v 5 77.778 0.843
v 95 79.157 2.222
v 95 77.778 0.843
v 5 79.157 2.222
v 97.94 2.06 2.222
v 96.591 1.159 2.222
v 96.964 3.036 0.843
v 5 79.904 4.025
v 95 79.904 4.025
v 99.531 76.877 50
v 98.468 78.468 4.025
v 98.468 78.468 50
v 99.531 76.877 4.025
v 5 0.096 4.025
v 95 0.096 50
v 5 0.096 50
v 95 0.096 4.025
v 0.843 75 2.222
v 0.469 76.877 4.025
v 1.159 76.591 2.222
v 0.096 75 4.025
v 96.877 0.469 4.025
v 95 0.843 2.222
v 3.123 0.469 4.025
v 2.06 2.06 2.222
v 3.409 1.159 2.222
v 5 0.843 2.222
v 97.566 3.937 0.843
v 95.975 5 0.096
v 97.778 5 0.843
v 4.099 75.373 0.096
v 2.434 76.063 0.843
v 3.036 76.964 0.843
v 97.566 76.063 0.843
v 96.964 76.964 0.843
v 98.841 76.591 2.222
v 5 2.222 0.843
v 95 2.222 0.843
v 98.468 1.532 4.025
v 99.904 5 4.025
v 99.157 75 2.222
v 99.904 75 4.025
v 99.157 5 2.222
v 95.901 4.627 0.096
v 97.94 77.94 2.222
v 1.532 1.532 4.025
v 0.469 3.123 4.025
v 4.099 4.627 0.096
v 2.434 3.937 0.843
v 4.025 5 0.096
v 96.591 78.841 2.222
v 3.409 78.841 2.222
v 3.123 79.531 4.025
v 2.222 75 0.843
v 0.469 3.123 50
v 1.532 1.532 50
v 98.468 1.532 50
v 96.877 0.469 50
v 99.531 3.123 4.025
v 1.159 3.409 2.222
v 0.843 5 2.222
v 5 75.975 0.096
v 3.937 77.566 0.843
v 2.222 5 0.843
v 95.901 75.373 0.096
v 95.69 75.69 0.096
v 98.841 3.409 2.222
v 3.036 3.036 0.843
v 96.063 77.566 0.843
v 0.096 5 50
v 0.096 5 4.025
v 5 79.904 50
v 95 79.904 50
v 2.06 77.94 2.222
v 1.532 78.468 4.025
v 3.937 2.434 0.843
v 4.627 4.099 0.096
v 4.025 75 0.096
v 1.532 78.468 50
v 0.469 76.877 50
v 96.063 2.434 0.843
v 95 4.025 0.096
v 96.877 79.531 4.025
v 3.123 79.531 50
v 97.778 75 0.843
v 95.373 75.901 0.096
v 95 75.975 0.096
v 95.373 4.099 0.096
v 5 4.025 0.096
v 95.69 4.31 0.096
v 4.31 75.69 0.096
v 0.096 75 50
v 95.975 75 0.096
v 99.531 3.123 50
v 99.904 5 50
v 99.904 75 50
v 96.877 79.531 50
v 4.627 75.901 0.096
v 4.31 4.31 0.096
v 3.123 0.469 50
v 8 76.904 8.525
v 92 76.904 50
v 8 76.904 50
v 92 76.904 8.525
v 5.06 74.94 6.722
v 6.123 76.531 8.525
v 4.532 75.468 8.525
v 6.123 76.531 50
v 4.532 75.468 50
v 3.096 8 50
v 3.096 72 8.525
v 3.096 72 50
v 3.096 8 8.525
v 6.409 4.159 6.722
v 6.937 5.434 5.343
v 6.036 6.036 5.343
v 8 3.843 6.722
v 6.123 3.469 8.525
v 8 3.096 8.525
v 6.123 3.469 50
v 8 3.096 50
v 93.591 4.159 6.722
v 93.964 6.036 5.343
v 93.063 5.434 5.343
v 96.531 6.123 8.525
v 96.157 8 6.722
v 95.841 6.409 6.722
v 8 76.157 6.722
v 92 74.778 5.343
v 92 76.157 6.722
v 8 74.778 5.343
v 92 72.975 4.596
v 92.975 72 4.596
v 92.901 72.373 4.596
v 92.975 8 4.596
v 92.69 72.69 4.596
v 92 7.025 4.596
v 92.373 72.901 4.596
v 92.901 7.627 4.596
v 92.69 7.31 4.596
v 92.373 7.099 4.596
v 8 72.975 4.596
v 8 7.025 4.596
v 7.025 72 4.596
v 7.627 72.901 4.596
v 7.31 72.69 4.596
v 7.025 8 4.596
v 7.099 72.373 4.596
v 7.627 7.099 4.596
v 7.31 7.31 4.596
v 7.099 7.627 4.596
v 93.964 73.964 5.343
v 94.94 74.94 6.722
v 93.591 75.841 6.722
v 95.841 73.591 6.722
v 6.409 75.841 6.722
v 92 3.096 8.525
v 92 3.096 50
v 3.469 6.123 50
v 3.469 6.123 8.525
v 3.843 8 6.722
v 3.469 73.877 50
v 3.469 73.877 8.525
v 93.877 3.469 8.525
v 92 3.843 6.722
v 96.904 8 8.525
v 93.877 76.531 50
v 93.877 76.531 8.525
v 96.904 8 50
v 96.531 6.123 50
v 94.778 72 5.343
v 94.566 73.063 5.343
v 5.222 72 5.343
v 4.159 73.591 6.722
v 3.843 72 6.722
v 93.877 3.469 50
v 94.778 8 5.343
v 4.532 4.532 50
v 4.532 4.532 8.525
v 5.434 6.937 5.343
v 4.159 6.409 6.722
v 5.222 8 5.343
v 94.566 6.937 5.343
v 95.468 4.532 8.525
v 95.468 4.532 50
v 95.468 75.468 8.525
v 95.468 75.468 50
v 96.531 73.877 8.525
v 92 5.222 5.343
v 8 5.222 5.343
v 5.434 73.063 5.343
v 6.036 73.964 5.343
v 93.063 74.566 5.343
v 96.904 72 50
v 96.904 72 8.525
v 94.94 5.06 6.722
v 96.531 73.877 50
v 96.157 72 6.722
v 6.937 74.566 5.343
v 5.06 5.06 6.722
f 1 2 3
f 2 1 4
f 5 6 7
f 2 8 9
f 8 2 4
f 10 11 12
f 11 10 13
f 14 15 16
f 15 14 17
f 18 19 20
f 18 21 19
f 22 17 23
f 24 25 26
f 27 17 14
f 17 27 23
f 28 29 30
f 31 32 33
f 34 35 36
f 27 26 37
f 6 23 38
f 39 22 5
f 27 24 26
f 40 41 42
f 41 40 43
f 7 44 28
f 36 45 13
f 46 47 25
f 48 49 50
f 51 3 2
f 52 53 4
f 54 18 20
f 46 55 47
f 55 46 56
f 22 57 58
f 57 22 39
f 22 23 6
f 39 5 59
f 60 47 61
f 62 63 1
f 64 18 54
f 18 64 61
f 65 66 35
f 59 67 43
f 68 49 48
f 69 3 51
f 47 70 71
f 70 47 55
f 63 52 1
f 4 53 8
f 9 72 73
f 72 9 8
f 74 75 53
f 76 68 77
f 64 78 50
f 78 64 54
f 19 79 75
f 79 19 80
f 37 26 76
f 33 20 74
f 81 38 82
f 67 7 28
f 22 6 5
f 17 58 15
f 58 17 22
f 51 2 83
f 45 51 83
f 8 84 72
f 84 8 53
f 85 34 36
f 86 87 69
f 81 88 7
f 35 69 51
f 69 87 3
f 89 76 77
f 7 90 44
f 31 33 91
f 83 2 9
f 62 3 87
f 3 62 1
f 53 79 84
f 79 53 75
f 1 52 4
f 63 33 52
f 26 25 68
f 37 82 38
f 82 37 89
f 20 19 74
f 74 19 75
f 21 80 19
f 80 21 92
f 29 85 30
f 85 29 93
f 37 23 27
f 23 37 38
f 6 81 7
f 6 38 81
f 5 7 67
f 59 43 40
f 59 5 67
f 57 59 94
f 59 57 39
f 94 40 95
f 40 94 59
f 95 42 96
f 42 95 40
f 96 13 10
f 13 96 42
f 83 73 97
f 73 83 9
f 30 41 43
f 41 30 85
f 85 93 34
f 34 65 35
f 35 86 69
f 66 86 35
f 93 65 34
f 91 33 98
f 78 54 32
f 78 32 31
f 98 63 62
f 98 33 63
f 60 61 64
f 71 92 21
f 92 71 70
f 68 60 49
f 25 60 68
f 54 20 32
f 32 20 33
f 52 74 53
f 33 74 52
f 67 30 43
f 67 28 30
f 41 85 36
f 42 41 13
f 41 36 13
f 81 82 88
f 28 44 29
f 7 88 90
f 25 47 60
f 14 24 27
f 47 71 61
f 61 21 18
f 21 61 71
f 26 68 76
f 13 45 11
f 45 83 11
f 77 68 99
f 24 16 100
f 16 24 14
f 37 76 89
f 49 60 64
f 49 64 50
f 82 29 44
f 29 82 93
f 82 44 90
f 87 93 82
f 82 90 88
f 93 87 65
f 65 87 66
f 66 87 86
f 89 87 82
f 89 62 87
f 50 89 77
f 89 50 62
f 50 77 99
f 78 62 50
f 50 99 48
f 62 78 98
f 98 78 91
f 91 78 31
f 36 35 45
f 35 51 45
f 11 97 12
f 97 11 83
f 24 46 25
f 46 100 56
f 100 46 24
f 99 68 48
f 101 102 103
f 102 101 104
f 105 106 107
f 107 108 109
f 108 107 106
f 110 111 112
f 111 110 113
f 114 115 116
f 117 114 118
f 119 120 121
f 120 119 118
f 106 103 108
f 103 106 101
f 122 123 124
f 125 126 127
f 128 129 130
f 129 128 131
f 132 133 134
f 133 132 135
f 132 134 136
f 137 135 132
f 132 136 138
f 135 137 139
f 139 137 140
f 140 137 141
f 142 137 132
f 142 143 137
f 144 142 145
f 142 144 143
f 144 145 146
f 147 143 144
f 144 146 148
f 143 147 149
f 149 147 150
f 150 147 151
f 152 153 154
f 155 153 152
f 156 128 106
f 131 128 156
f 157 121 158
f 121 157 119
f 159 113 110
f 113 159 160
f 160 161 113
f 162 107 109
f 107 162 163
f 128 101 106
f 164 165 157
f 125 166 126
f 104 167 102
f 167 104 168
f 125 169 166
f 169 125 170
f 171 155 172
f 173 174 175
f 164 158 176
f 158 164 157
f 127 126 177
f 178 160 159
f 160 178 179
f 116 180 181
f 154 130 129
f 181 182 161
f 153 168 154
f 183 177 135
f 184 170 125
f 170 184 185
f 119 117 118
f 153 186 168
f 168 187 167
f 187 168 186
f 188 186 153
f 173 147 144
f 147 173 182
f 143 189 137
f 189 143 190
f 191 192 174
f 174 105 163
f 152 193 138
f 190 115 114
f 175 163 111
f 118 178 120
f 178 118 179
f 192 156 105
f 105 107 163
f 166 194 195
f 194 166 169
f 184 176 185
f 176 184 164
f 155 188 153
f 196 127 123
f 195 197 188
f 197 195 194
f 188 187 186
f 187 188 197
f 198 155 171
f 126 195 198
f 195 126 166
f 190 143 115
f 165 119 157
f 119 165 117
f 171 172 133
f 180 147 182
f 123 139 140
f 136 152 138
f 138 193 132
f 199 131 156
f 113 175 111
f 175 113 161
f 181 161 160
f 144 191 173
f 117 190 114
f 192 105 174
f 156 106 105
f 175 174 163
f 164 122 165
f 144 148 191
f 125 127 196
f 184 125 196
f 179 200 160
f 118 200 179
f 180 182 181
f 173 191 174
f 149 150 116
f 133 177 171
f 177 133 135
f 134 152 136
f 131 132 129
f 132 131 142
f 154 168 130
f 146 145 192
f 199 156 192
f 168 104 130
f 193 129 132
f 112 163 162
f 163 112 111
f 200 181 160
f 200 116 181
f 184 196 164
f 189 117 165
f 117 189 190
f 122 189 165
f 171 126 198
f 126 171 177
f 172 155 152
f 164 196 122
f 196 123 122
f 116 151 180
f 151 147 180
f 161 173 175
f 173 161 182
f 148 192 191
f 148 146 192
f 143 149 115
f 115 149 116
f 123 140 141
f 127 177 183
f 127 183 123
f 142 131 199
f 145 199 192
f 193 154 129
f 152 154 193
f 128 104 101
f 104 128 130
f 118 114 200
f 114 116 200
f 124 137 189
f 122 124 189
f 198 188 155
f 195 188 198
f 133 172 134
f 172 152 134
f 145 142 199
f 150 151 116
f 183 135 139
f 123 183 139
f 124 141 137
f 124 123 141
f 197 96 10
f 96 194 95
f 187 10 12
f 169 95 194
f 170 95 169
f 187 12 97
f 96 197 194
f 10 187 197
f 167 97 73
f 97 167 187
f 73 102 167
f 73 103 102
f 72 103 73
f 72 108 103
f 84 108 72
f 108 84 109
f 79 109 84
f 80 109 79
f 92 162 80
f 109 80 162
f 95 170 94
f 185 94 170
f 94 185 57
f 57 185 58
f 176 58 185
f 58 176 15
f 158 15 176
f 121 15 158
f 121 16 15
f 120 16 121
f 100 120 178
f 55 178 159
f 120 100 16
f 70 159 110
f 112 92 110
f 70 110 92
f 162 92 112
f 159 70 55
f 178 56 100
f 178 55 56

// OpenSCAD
// Customizable bin generator with rounded edges

// Editable parameters
length = 100;      // Length of the bin
width = 80;        // Width of the bin
height = 50;       // Height of the bin
thickness = 3;     // Wall and bottom thickness
corner_radius = 5; // Radius for rounded edges

module rounded_bin() {
    intersection()
    {
        difference() {
            // Outer shell with rounded corners
            minkowski() {
                cube([length - 2 * corner_radius, width - 2 * corner_radius, height], center = true);
                sphere(corner_radius);
            }
            // Inner shell with rounded corners (to create the hollow bin)
            translate([0, 0, thickness]) {
                minkowski() {
                    cube([length - 2 * corner_radius - 2 * thickness, width - 2 * corner_radius - 2 * thickness, height - thickness], center = true);
                    sphere(corner_radius);
                }
            }
        }
        translate([0, 0, -1 * corner_radius]) {
                cube([length, width, height], center = true);
            }
    }
}

// Render the bin
translate([length/2, width/2, height/2 + corner_radius])
rounded_bin();
